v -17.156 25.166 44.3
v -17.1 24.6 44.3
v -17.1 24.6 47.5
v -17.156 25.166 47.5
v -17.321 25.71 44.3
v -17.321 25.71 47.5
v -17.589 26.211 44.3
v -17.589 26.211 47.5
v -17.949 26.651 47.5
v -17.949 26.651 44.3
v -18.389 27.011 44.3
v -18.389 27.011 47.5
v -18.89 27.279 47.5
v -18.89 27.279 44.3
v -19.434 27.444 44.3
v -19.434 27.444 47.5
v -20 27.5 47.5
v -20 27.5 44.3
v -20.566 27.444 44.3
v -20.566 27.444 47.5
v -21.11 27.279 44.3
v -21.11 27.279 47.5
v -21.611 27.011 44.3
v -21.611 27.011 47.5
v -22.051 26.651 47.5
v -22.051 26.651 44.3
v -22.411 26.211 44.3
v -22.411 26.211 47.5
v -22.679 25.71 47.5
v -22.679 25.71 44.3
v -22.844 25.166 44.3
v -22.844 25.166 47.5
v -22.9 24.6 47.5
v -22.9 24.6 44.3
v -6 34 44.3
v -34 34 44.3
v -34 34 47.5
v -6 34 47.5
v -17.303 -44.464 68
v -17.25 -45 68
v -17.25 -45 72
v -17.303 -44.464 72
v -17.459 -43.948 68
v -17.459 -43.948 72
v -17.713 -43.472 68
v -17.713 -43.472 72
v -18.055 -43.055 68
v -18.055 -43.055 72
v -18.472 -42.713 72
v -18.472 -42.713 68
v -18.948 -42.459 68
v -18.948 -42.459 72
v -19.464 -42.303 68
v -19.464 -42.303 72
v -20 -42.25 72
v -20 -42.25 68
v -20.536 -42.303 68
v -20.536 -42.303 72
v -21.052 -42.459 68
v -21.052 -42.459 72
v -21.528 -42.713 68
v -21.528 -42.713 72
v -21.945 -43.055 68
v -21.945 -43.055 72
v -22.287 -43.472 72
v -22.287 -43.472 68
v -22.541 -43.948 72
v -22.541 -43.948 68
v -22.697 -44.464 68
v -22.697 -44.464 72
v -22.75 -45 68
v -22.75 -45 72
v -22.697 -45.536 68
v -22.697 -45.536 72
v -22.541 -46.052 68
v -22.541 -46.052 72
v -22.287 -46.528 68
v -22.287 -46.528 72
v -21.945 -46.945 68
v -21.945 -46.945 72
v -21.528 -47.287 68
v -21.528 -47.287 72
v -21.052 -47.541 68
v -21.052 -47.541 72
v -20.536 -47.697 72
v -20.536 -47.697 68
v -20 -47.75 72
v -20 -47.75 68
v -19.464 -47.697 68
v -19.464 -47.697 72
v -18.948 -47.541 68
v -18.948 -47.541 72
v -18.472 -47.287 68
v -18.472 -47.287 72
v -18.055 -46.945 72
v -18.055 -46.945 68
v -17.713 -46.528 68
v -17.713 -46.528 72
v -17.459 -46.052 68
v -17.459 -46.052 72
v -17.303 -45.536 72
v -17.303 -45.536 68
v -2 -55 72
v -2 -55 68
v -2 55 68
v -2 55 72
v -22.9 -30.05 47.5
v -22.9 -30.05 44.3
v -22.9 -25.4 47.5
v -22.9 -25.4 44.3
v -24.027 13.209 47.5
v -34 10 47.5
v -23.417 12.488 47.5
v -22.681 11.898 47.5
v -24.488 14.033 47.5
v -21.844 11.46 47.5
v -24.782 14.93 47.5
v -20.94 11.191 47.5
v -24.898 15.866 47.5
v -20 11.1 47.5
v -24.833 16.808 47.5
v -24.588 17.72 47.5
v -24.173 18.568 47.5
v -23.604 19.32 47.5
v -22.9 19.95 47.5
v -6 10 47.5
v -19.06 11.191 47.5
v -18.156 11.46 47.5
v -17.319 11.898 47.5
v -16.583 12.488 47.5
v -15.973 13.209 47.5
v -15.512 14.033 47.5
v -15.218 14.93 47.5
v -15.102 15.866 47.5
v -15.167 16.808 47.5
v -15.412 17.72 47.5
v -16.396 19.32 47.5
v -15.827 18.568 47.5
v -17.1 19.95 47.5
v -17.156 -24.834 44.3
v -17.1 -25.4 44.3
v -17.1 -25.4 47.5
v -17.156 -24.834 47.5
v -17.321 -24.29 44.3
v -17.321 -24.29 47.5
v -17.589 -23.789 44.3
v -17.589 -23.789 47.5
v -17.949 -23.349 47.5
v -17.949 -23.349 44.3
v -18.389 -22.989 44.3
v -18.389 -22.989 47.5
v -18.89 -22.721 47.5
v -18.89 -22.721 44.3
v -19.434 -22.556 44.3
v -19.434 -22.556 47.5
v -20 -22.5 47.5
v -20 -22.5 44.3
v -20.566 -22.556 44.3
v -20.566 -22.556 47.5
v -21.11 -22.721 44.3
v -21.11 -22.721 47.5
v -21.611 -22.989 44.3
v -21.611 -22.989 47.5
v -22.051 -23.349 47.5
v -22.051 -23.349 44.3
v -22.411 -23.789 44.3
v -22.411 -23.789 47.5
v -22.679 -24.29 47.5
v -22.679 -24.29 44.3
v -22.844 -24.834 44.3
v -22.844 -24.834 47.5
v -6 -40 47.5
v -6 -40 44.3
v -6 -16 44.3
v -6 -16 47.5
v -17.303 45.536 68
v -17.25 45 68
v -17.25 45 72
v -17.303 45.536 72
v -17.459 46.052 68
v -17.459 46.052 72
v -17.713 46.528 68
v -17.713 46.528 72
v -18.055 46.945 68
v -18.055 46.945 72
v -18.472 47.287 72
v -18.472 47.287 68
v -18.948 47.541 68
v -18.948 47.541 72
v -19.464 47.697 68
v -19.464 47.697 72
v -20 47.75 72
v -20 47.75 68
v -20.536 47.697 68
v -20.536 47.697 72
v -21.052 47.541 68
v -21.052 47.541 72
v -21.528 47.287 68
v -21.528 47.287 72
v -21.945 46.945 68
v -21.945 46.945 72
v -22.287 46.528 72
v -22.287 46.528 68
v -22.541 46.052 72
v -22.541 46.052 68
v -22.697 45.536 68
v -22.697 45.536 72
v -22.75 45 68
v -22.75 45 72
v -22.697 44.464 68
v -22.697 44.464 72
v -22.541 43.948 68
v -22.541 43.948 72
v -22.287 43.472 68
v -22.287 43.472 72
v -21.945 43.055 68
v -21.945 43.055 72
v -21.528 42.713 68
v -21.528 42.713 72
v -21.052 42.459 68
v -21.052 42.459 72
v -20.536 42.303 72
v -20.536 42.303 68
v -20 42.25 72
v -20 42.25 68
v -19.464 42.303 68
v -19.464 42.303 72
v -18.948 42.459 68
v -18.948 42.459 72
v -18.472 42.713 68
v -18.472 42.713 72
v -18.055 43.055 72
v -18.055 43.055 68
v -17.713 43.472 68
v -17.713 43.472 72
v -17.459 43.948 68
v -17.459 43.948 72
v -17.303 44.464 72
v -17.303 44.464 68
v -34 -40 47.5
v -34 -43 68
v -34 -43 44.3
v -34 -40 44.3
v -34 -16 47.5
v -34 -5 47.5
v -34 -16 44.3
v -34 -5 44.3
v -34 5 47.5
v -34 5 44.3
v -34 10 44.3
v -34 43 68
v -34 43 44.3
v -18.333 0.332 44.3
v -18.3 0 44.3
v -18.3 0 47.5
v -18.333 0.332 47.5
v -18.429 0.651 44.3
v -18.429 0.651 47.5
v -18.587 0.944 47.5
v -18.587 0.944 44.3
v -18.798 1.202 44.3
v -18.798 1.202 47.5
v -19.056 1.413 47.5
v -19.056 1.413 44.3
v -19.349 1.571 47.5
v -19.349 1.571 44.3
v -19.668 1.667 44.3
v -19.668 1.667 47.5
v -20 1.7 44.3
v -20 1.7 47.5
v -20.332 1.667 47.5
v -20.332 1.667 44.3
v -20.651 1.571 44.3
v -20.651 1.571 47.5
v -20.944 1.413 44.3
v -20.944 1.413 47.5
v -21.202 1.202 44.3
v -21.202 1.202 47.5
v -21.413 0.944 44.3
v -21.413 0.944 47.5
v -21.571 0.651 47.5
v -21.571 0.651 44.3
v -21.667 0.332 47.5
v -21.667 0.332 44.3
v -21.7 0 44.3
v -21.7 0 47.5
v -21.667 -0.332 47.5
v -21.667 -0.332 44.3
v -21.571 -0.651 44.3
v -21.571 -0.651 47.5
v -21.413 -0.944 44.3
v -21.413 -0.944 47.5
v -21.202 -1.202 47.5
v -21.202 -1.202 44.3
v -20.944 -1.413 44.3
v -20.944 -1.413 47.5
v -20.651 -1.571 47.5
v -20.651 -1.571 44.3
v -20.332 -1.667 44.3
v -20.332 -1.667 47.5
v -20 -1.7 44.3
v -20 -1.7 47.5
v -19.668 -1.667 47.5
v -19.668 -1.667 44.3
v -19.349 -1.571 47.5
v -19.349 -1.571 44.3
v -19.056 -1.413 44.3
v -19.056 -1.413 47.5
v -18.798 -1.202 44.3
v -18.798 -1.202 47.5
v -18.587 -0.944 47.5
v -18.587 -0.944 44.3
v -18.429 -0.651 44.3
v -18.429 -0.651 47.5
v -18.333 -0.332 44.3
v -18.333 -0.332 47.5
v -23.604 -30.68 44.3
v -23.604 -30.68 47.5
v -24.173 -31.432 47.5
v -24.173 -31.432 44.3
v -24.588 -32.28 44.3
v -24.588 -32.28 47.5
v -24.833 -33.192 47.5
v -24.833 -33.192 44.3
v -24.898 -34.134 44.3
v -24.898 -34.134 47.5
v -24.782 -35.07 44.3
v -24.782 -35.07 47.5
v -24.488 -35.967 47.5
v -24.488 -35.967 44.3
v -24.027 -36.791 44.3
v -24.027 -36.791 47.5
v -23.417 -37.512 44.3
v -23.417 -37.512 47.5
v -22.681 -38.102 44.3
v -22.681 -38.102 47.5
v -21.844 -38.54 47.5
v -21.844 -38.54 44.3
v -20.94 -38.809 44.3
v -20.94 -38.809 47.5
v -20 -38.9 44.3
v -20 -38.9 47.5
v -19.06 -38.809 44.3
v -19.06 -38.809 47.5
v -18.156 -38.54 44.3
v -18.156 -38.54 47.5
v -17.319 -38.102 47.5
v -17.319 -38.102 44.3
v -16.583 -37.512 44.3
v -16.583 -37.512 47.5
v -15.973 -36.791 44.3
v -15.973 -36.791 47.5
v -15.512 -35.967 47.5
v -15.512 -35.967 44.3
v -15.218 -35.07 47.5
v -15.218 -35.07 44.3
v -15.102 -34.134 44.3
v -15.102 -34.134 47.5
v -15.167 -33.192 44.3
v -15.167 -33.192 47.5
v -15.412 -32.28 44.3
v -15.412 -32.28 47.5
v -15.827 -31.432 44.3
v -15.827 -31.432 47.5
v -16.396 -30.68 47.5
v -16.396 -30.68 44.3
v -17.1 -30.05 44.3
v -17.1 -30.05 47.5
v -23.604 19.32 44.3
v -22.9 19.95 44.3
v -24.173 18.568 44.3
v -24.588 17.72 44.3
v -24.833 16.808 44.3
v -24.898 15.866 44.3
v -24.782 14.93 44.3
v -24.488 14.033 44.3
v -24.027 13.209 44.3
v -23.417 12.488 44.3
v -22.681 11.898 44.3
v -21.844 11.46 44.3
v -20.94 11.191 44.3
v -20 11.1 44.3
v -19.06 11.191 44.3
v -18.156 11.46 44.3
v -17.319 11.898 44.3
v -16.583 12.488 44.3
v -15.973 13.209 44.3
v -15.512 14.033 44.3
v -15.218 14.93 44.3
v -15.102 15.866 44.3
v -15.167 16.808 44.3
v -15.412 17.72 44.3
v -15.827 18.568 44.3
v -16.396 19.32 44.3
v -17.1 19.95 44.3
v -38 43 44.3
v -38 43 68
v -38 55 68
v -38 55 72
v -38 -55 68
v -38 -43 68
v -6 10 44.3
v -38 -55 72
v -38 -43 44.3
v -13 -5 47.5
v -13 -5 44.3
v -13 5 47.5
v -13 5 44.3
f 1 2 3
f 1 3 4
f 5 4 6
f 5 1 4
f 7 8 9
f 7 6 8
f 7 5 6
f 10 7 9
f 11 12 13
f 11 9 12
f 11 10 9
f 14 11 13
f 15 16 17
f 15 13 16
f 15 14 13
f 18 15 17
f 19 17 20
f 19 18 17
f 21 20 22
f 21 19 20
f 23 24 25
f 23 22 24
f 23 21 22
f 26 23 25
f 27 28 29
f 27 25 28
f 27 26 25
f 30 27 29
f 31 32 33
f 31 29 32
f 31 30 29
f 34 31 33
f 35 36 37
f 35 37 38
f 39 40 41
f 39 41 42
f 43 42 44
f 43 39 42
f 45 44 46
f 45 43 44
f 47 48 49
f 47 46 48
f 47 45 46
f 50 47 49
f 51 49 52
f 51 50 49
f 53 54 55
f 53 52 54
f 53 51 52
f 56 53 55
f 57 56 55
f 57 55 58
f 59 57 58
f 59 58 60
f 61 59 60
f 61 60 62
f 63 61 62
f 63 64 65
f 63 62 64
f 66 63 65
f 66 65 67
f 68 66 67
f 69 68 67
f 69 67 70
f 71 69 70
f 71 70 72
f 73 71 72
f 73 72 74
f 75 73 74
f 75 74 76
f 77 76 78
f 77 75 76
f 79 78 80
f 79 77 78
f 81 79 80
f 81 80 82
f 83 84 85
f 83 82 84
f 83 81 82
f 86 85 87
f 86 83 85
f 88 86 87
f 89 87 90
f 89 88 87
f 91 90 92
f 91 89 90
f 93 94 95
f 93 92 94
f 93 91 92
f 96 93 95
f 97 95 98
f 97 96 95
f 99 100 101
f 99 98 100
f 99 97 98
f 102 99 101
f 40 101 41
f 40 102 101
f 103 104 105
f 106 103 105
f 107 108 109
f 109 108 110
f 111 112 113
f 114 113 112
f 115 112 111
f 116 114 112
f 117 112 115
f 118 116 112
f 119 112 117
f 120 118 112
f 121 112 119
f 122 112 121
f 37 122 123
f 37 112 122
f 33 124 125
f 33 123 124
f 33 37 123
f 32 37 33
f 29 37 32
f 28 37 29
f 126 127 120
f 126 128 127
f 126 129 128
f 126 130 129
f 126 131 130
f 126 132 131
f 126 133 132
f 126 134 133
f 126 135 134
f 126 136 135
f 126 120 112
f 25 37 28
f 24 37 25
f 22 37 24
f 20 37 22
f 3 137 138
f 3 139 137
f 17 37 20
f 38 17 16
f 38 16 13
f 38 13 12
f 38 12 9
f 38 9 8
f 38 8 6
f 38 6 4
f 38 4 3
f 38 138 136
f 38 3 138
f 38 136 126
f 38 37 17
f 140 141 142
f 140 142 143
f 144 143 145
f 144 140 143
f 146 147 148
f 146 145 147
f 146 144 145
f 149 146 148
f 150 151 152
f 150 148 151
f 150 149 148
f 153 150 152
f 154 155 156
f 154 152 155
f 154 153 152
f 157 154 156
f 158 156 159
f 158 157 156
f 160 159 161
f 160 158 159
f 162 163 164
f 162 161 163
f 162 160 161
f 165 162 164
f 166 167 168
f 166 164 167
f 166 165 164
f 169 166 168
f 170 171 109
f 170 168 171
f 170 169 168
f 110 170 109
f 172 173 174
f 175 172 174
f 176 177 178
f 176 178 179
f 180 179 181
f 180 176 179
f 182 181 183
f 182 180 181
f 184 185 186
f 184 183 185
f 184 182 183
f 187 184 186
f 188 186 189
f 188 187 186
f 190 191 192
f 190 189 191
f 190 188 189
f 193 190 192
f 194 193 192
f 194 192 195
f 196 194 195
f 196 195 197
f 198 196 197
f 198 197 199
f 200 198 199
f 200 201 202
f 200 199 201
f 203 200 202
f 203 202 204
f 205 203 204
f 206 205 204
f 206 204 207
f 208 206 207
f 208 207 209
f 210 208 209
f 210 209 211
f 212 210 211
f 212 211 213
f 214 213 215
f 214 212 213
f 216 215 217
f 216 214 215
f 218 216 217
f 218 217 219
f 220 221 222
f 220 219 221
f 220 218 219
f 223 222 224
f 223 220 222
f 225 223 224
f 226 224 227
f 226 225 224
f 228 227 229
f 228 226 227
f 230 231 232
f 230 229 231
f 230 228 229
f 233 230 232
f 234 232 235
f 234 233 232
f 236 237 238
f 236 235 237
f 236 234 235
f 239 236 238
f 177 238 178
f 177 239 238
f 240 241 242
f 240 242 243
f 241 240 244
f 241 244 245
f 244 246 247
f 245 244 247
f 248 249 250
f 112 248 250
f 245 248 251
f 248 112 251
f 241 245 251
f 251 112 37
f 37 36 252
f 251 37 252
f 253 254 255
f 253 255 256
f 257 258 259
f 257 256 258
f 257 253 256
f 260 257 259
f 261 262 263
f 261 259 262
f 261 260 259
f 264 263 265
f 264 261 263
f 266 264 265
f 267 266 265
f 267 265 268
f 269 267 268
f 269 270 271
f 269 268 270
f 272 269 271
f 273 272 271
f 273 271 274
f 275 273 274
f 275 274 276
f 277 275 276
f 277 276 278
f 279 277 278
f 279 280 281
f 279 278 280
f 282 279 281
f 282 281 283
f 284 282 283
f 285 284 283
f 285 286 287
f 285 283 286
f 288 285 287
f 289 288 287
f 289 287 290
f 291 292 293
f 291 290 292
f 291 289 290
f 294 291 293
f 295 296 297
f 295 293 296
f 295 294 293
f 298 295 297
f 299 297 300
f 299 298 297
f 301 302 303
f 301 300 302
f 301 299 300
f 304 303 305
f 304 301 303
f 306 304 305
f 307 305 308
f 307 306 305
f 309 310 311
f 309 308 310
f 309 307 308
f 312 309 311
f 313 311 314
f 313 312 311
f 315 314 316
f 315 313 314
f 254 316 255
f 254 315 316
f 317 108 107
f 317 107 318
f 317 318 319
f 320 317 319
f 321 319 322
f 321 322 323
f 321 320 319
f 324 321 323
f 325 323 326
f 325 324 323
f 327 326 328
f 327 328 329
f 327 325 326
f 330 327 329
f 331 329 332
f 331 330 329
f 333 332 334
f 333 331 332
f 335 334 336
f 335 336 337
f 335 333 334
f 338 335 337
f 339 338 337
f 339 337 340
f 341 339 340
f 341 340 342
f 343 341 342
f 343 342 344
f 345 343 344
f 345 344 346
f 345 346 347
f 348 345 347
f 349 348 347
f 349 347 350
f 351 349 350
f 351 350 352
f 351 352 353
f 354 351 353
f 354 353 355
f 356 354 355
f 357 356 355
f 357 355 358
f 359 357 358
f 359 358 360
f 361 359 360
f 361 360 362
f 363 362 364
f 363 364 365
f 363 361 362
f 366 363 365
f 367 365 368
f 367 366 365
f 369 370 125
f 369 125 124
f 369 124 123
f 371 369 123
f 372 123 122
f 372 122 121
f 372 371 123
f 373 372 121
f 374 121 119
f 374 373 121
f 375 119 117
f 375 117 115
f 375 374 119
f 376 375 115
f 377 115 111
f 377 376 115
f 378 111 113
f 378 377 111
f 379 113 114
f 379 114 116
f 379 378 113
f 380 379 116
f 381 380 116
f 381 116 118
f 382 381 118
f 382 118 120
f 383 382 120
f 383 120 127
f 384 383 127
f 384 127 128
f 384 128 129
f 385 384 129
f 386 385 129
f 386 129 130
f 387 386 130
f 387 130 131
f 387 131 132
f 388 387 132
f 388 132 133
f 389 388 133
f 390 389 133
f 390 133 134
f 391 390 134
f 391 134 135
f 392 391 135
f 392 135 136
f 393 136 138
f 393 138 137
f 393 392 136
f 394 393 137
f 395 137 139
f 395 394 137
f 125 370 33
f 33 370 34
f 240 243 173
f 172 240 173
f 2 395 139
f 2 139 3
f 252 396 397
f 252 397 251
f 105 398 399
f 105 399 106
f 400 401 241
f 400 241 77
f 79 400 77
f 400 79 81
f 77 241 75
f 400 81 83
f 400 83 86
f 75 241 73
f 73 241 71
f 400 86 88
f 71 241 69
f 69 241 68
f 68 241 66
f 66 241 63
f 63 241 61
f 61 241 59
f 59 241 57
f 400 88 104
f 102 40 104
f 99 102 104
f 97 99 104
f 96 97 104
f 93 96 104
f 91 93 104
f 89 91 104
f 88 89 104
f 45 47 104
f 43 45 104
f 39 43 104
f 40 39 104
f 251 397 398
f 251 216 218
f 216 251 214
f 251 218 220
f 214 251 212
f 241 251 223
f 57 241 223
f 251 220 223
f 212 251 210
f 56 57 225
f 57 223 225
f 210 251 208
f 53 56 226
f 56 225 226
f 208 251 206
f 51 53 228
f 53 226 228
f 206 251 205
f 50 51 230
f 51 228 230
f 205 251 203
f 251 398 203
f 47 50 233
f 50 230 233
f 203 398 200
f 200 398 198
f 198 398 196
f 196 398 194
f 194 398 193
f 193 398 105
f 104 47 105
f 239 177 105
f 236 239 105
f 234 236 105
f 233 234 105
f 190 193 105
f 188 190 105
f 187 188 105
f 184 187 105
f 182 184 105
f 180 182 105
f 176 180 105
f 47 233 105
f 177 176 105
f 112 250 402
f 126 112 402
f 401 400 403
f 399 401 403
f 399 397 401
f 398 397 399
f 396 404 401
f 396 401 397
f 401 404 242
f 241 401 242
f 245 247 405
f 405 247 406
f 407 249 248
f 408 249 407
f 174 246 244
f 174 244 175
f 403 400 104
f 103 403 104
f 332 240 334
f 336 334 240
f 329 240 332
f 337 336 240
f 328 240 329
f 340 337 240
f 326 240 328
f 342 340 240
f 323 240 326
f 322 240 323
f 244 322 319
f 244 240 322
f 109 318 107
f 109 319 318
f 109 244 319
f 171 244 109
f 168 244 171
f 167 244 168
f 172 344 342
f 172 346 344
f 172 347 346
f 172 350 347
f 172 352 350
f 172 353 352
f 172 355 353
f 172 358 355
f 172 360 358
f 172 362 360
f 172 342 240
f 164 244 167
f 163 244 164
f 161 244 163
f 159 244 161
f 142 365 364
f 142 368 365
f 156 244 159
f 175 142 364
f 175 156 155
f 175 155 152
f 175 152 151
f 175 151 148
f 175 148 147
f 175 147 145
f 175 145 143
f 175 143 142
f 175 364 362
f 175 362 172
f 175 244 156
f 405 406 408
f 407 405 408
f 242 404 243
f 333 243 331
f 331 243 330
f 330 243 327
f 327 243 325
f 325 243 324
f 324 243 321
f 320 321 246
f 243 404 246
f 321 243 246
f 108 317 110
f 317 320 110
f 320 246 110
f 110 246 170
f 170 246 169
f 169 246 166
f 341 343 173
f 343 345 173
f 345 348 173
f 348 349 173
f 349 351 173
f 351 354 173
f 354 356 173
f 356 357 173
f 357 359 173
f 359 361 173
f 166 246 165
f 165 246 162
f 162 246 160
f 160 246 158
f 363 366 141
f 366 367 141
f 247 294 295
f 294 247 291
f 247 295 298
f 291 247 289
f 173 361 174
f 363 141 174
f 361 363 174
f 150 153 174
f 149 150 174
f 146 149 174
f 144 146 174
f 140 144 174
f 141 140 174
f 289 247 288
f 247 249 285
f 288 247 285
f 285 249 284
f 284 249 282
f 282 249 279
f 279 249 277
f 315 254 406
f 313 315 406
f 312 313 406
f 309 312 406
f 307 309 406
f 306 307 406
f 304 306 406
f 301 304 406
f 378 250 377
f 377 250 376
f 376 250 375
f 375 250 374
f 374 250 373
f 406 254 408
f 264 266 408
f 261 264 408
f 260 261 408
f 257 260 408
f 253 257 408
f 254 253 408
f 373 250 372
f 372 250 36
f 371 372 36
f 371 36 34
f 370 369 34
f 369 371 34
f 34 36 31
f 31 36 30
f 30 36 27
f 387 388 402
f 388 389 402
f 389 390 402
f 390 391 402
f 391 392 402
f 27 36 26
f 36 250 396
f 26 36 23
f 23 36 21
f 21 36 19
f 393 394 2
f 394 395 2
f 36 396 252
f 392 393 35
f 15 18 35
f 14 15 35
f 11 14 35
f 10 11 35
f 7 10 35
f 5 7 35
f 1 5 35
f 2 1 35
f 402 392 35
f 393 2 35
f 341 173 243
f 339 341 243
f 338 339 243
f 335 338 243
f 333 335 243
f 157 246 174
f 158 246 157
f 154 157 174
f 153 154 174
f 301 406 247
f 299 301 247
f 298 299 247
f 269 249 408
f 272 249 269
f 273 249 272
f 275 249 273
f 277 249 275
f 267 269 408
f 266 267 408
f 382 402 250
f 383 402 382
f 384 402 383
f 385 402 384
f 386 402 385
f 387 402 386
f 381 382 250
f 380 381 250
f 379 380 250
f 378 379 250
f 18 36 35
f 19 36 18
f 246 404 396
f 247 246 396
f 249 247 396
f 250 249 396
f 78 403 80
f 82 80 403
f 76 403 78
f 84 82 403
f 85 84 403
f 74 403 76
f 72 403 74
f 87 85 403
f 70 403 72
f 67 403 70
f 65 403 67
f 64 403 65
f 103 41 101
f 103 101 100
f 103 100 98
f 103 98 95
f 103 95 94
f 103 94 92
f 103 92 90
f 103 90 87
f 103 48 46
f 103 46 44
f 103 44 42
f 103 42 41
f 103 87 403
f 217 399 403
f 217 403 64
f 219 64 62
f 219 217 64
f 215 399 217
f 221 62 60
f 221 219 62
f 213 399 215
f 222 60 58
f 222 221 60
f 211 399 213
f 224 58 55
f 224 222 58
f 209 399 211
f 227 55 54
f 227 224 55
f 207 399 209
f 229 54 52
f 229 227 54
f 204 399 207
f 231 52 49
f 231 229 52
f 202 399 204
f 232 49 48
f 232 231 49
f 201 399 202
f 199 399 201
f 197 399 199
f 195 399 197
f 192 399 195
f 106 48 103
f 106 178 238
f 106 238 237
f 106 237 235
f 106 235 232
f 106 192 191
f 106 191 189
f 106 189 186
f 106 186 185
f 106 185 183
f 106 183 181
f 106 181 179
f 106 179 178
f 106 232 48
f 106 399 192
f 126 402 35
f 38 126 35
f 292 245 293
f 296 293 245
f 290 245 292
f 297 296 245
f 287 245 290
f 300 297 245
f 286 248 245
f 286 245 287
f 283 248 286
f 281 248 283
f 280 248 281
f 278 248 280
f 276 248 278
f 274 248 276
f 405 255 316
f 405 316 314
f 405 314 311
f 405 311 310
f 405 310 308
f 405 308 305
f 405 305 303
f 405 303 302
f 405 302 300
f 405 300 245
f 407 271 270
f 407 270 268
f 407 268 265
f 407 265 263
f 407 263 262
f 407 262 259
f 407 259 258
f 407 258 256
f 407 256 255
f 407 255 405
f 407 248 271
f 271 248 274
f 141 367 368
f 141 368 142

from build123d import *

# Parameters (mm, degrees)
WALL_MOUNTING_PLATE_4MM_START        = 68
SKETCH1_W                            = 36
SKETCH1_H                            = 110
WALL_MOUNTING_PLATE_4MM_DEPTH        = 4
SIDE_OFFSET_WEB_START                = 44.3
SKETCH2_W                            = 4
SKETCH2_H                            = 86
SIDE_OFFSET_WEB_DEPTH                = 24
TWO_PEG_RECEIVER_TABS_START          = 44.3
SKETCH3_W                            = 32
SKETCH3_H                            = 24
TWO_PEG_RECEIVER_TABS_DEPTH          = 3.2
PEG_HEAD_ENTRY_D9P8_START            = 43
SKETCH4_R                            = 4.9
PEG_HEAD_ENTRY_D9P8_DEPTH            = 9
DROP_IN_PEG_SLOTS_W5P8_START         = 43
SKETCH5_W                            = 5.8
SKETCH5_H                            = 8.6
DROP_IN_PEG_SLOTS_W5P8_DEPTH         = 9
ROUNDED_LOAD_SEATS_START             = 43
SKETCH6_R                            = 2.9
ROUNDED_LOAD_SEATS_DEPTH             = 9
WALL_SCREW_CLEARANCE_D5P5_START      = 67
SKETCH7_R                            = 2.75
WALL_SCREW_CLEARANCE_D5P5_DEPTH      = 7
ANTI_LIFT_LOCK_TAB_START             = 44.3
SKETCH8_W                            = 25
SKETCH8_H                            = 10
ANTI_LIFT_LOCK_TAB_DEPTH             = 3.2
ANTI_LIFT_SCREW_CLEARANCE_D3P4_START = 43
SKETCH9_R                            = 1.7
ANTI_LIFT_SCREW_CLEARANCE_D3P4_DEPTH = 7


with BuildPart() as part:
    # Sketch1 → Wall_mounting_plate_4mm (new body)
    with BuildSketch(Plane.XY.offset(WALL_MOUNTING_PLATE_4MM_START)):
        with Locations((-20, 0)):
            Rectangle(SKETCH1_W, SKETCH1_H)
    extrude(amount=WALL_MOUNTING_PLATE_4MM_DEPTH)

    # Sketch2 → Side_offset_web (add)
    with BuildSketch(Plane.XY.offset(SIDE_OFFSET_WEB_START)):
        with Locations((-36, 0)):
            Rectangle(SKETCH2_W, SKETCH2_H)
    extrude(amount=SIDE_OFFSET_WEB_DEPTH)

    # Sketch3 → Two_peg_receiver_tabs (add)
    with BuildSketch(Plane.XY.offset(TWO_PEG_RECEIVER_TABS_START)):
        with Locations((-22, -28)):
            Rectangle(SKETCH3_W, SKETCH3_H)
        with Locations((-22, 22)):
            Rectangle(SKETCH3_W, SKETCH3_H)
    extrude(amount=TWO_PEG_RECEIVER_TABS_DEPTH)

    # Sketch4 → Peg_head_entry_D9p8 (cut)
    with BuildSketch(Plane.XY.offset(PEG_HEAD_ENTRY_D9P8_START)):
        with Locations((-20, -34)):
            Circle(SKETCH4_R)
        with Locations((-20, 16)):
            Circle(SKETCH4_R)
    extrude(amount=PEG_HEAD_ENTRY_D9P8_DEPTH, mode=Mode.SUBTRACT)

    # Sketch5 → Drop_in_peg_slots_W5p8 (cut)
    with BuildSketch(Plane.XY.offset(DROP_IN_PEG_SLOTS_W5P8_START)):
        with Locations((-20, -29.7)):
            Rectangle(SKETCH5_W, SKETCH5_H)
        with Locations((-20, 20.3)):
            Rectangle(SKETCH5_W, SKETCH5_H)
    extrude(amount=DROP_IN_PEG_SLOTS_W5P8_DEPTH, mode=Mode.SUBTRACT)

    # Sketch6 → Rounded_load_seats (cut)
    with BuildSketch(Plane.XY.offset(ROUNDED_LOAD_SEATS_START)):
        with Locations((-20, -25.4)):
            Circle(SKETCH6_R)
        with Locations((-20, 24.6)):
            Circle(SKETCH6_R)
    extrude(amount=ROUNDED_LOAD_SEATS_DEPTH, mode=Mode.SUBTRACT)

    # Sketch7 → Wall_screw_clearance_D5p5 (cut)
    with BuildSketch(Plane.XY.offset(WALL_SCREW_CLEARANCE_D5P5_START)):
        with Locations((-20, -45)):
            Circle(SKETCH7_R)
        with Locations((-20, 45)):
            Circle(SKETCH7_R)
    extrude(amount=WALL_SCREW_CLEARANCE_D5P5_DEPTH, mode=Mode.SUBTRACT)

    # Sketch8 → Anti_lift_lock_tab (add)
    with BuildSketch(Plane.XY.offset(ANTI_LIFT_LOCK_TAB_START)):
        with Locations((-25.5, 0)):
            Rectangle(SKETCH8_W, SKETCH8_H)
    extrude(amount=ANTI_LIFT_LOCK_TAB_DEPTH)

    # Sketch9 → Anti_lift_screw_clearance_D3p4 (cut)
    with BuildSketch(Plane.XY.offset(ANTI_LIFT_SCREW_CLEARANCE_D3P4_START)):
        with Locations((-20, 0)):
            Circle(SKETCH9_R)
    extrude(amount=ANTI_LIFT_SCREW_CLEARANCE_D3P4_DEPTH, mode=Mode.SUBTRACT)


solid = part.part
